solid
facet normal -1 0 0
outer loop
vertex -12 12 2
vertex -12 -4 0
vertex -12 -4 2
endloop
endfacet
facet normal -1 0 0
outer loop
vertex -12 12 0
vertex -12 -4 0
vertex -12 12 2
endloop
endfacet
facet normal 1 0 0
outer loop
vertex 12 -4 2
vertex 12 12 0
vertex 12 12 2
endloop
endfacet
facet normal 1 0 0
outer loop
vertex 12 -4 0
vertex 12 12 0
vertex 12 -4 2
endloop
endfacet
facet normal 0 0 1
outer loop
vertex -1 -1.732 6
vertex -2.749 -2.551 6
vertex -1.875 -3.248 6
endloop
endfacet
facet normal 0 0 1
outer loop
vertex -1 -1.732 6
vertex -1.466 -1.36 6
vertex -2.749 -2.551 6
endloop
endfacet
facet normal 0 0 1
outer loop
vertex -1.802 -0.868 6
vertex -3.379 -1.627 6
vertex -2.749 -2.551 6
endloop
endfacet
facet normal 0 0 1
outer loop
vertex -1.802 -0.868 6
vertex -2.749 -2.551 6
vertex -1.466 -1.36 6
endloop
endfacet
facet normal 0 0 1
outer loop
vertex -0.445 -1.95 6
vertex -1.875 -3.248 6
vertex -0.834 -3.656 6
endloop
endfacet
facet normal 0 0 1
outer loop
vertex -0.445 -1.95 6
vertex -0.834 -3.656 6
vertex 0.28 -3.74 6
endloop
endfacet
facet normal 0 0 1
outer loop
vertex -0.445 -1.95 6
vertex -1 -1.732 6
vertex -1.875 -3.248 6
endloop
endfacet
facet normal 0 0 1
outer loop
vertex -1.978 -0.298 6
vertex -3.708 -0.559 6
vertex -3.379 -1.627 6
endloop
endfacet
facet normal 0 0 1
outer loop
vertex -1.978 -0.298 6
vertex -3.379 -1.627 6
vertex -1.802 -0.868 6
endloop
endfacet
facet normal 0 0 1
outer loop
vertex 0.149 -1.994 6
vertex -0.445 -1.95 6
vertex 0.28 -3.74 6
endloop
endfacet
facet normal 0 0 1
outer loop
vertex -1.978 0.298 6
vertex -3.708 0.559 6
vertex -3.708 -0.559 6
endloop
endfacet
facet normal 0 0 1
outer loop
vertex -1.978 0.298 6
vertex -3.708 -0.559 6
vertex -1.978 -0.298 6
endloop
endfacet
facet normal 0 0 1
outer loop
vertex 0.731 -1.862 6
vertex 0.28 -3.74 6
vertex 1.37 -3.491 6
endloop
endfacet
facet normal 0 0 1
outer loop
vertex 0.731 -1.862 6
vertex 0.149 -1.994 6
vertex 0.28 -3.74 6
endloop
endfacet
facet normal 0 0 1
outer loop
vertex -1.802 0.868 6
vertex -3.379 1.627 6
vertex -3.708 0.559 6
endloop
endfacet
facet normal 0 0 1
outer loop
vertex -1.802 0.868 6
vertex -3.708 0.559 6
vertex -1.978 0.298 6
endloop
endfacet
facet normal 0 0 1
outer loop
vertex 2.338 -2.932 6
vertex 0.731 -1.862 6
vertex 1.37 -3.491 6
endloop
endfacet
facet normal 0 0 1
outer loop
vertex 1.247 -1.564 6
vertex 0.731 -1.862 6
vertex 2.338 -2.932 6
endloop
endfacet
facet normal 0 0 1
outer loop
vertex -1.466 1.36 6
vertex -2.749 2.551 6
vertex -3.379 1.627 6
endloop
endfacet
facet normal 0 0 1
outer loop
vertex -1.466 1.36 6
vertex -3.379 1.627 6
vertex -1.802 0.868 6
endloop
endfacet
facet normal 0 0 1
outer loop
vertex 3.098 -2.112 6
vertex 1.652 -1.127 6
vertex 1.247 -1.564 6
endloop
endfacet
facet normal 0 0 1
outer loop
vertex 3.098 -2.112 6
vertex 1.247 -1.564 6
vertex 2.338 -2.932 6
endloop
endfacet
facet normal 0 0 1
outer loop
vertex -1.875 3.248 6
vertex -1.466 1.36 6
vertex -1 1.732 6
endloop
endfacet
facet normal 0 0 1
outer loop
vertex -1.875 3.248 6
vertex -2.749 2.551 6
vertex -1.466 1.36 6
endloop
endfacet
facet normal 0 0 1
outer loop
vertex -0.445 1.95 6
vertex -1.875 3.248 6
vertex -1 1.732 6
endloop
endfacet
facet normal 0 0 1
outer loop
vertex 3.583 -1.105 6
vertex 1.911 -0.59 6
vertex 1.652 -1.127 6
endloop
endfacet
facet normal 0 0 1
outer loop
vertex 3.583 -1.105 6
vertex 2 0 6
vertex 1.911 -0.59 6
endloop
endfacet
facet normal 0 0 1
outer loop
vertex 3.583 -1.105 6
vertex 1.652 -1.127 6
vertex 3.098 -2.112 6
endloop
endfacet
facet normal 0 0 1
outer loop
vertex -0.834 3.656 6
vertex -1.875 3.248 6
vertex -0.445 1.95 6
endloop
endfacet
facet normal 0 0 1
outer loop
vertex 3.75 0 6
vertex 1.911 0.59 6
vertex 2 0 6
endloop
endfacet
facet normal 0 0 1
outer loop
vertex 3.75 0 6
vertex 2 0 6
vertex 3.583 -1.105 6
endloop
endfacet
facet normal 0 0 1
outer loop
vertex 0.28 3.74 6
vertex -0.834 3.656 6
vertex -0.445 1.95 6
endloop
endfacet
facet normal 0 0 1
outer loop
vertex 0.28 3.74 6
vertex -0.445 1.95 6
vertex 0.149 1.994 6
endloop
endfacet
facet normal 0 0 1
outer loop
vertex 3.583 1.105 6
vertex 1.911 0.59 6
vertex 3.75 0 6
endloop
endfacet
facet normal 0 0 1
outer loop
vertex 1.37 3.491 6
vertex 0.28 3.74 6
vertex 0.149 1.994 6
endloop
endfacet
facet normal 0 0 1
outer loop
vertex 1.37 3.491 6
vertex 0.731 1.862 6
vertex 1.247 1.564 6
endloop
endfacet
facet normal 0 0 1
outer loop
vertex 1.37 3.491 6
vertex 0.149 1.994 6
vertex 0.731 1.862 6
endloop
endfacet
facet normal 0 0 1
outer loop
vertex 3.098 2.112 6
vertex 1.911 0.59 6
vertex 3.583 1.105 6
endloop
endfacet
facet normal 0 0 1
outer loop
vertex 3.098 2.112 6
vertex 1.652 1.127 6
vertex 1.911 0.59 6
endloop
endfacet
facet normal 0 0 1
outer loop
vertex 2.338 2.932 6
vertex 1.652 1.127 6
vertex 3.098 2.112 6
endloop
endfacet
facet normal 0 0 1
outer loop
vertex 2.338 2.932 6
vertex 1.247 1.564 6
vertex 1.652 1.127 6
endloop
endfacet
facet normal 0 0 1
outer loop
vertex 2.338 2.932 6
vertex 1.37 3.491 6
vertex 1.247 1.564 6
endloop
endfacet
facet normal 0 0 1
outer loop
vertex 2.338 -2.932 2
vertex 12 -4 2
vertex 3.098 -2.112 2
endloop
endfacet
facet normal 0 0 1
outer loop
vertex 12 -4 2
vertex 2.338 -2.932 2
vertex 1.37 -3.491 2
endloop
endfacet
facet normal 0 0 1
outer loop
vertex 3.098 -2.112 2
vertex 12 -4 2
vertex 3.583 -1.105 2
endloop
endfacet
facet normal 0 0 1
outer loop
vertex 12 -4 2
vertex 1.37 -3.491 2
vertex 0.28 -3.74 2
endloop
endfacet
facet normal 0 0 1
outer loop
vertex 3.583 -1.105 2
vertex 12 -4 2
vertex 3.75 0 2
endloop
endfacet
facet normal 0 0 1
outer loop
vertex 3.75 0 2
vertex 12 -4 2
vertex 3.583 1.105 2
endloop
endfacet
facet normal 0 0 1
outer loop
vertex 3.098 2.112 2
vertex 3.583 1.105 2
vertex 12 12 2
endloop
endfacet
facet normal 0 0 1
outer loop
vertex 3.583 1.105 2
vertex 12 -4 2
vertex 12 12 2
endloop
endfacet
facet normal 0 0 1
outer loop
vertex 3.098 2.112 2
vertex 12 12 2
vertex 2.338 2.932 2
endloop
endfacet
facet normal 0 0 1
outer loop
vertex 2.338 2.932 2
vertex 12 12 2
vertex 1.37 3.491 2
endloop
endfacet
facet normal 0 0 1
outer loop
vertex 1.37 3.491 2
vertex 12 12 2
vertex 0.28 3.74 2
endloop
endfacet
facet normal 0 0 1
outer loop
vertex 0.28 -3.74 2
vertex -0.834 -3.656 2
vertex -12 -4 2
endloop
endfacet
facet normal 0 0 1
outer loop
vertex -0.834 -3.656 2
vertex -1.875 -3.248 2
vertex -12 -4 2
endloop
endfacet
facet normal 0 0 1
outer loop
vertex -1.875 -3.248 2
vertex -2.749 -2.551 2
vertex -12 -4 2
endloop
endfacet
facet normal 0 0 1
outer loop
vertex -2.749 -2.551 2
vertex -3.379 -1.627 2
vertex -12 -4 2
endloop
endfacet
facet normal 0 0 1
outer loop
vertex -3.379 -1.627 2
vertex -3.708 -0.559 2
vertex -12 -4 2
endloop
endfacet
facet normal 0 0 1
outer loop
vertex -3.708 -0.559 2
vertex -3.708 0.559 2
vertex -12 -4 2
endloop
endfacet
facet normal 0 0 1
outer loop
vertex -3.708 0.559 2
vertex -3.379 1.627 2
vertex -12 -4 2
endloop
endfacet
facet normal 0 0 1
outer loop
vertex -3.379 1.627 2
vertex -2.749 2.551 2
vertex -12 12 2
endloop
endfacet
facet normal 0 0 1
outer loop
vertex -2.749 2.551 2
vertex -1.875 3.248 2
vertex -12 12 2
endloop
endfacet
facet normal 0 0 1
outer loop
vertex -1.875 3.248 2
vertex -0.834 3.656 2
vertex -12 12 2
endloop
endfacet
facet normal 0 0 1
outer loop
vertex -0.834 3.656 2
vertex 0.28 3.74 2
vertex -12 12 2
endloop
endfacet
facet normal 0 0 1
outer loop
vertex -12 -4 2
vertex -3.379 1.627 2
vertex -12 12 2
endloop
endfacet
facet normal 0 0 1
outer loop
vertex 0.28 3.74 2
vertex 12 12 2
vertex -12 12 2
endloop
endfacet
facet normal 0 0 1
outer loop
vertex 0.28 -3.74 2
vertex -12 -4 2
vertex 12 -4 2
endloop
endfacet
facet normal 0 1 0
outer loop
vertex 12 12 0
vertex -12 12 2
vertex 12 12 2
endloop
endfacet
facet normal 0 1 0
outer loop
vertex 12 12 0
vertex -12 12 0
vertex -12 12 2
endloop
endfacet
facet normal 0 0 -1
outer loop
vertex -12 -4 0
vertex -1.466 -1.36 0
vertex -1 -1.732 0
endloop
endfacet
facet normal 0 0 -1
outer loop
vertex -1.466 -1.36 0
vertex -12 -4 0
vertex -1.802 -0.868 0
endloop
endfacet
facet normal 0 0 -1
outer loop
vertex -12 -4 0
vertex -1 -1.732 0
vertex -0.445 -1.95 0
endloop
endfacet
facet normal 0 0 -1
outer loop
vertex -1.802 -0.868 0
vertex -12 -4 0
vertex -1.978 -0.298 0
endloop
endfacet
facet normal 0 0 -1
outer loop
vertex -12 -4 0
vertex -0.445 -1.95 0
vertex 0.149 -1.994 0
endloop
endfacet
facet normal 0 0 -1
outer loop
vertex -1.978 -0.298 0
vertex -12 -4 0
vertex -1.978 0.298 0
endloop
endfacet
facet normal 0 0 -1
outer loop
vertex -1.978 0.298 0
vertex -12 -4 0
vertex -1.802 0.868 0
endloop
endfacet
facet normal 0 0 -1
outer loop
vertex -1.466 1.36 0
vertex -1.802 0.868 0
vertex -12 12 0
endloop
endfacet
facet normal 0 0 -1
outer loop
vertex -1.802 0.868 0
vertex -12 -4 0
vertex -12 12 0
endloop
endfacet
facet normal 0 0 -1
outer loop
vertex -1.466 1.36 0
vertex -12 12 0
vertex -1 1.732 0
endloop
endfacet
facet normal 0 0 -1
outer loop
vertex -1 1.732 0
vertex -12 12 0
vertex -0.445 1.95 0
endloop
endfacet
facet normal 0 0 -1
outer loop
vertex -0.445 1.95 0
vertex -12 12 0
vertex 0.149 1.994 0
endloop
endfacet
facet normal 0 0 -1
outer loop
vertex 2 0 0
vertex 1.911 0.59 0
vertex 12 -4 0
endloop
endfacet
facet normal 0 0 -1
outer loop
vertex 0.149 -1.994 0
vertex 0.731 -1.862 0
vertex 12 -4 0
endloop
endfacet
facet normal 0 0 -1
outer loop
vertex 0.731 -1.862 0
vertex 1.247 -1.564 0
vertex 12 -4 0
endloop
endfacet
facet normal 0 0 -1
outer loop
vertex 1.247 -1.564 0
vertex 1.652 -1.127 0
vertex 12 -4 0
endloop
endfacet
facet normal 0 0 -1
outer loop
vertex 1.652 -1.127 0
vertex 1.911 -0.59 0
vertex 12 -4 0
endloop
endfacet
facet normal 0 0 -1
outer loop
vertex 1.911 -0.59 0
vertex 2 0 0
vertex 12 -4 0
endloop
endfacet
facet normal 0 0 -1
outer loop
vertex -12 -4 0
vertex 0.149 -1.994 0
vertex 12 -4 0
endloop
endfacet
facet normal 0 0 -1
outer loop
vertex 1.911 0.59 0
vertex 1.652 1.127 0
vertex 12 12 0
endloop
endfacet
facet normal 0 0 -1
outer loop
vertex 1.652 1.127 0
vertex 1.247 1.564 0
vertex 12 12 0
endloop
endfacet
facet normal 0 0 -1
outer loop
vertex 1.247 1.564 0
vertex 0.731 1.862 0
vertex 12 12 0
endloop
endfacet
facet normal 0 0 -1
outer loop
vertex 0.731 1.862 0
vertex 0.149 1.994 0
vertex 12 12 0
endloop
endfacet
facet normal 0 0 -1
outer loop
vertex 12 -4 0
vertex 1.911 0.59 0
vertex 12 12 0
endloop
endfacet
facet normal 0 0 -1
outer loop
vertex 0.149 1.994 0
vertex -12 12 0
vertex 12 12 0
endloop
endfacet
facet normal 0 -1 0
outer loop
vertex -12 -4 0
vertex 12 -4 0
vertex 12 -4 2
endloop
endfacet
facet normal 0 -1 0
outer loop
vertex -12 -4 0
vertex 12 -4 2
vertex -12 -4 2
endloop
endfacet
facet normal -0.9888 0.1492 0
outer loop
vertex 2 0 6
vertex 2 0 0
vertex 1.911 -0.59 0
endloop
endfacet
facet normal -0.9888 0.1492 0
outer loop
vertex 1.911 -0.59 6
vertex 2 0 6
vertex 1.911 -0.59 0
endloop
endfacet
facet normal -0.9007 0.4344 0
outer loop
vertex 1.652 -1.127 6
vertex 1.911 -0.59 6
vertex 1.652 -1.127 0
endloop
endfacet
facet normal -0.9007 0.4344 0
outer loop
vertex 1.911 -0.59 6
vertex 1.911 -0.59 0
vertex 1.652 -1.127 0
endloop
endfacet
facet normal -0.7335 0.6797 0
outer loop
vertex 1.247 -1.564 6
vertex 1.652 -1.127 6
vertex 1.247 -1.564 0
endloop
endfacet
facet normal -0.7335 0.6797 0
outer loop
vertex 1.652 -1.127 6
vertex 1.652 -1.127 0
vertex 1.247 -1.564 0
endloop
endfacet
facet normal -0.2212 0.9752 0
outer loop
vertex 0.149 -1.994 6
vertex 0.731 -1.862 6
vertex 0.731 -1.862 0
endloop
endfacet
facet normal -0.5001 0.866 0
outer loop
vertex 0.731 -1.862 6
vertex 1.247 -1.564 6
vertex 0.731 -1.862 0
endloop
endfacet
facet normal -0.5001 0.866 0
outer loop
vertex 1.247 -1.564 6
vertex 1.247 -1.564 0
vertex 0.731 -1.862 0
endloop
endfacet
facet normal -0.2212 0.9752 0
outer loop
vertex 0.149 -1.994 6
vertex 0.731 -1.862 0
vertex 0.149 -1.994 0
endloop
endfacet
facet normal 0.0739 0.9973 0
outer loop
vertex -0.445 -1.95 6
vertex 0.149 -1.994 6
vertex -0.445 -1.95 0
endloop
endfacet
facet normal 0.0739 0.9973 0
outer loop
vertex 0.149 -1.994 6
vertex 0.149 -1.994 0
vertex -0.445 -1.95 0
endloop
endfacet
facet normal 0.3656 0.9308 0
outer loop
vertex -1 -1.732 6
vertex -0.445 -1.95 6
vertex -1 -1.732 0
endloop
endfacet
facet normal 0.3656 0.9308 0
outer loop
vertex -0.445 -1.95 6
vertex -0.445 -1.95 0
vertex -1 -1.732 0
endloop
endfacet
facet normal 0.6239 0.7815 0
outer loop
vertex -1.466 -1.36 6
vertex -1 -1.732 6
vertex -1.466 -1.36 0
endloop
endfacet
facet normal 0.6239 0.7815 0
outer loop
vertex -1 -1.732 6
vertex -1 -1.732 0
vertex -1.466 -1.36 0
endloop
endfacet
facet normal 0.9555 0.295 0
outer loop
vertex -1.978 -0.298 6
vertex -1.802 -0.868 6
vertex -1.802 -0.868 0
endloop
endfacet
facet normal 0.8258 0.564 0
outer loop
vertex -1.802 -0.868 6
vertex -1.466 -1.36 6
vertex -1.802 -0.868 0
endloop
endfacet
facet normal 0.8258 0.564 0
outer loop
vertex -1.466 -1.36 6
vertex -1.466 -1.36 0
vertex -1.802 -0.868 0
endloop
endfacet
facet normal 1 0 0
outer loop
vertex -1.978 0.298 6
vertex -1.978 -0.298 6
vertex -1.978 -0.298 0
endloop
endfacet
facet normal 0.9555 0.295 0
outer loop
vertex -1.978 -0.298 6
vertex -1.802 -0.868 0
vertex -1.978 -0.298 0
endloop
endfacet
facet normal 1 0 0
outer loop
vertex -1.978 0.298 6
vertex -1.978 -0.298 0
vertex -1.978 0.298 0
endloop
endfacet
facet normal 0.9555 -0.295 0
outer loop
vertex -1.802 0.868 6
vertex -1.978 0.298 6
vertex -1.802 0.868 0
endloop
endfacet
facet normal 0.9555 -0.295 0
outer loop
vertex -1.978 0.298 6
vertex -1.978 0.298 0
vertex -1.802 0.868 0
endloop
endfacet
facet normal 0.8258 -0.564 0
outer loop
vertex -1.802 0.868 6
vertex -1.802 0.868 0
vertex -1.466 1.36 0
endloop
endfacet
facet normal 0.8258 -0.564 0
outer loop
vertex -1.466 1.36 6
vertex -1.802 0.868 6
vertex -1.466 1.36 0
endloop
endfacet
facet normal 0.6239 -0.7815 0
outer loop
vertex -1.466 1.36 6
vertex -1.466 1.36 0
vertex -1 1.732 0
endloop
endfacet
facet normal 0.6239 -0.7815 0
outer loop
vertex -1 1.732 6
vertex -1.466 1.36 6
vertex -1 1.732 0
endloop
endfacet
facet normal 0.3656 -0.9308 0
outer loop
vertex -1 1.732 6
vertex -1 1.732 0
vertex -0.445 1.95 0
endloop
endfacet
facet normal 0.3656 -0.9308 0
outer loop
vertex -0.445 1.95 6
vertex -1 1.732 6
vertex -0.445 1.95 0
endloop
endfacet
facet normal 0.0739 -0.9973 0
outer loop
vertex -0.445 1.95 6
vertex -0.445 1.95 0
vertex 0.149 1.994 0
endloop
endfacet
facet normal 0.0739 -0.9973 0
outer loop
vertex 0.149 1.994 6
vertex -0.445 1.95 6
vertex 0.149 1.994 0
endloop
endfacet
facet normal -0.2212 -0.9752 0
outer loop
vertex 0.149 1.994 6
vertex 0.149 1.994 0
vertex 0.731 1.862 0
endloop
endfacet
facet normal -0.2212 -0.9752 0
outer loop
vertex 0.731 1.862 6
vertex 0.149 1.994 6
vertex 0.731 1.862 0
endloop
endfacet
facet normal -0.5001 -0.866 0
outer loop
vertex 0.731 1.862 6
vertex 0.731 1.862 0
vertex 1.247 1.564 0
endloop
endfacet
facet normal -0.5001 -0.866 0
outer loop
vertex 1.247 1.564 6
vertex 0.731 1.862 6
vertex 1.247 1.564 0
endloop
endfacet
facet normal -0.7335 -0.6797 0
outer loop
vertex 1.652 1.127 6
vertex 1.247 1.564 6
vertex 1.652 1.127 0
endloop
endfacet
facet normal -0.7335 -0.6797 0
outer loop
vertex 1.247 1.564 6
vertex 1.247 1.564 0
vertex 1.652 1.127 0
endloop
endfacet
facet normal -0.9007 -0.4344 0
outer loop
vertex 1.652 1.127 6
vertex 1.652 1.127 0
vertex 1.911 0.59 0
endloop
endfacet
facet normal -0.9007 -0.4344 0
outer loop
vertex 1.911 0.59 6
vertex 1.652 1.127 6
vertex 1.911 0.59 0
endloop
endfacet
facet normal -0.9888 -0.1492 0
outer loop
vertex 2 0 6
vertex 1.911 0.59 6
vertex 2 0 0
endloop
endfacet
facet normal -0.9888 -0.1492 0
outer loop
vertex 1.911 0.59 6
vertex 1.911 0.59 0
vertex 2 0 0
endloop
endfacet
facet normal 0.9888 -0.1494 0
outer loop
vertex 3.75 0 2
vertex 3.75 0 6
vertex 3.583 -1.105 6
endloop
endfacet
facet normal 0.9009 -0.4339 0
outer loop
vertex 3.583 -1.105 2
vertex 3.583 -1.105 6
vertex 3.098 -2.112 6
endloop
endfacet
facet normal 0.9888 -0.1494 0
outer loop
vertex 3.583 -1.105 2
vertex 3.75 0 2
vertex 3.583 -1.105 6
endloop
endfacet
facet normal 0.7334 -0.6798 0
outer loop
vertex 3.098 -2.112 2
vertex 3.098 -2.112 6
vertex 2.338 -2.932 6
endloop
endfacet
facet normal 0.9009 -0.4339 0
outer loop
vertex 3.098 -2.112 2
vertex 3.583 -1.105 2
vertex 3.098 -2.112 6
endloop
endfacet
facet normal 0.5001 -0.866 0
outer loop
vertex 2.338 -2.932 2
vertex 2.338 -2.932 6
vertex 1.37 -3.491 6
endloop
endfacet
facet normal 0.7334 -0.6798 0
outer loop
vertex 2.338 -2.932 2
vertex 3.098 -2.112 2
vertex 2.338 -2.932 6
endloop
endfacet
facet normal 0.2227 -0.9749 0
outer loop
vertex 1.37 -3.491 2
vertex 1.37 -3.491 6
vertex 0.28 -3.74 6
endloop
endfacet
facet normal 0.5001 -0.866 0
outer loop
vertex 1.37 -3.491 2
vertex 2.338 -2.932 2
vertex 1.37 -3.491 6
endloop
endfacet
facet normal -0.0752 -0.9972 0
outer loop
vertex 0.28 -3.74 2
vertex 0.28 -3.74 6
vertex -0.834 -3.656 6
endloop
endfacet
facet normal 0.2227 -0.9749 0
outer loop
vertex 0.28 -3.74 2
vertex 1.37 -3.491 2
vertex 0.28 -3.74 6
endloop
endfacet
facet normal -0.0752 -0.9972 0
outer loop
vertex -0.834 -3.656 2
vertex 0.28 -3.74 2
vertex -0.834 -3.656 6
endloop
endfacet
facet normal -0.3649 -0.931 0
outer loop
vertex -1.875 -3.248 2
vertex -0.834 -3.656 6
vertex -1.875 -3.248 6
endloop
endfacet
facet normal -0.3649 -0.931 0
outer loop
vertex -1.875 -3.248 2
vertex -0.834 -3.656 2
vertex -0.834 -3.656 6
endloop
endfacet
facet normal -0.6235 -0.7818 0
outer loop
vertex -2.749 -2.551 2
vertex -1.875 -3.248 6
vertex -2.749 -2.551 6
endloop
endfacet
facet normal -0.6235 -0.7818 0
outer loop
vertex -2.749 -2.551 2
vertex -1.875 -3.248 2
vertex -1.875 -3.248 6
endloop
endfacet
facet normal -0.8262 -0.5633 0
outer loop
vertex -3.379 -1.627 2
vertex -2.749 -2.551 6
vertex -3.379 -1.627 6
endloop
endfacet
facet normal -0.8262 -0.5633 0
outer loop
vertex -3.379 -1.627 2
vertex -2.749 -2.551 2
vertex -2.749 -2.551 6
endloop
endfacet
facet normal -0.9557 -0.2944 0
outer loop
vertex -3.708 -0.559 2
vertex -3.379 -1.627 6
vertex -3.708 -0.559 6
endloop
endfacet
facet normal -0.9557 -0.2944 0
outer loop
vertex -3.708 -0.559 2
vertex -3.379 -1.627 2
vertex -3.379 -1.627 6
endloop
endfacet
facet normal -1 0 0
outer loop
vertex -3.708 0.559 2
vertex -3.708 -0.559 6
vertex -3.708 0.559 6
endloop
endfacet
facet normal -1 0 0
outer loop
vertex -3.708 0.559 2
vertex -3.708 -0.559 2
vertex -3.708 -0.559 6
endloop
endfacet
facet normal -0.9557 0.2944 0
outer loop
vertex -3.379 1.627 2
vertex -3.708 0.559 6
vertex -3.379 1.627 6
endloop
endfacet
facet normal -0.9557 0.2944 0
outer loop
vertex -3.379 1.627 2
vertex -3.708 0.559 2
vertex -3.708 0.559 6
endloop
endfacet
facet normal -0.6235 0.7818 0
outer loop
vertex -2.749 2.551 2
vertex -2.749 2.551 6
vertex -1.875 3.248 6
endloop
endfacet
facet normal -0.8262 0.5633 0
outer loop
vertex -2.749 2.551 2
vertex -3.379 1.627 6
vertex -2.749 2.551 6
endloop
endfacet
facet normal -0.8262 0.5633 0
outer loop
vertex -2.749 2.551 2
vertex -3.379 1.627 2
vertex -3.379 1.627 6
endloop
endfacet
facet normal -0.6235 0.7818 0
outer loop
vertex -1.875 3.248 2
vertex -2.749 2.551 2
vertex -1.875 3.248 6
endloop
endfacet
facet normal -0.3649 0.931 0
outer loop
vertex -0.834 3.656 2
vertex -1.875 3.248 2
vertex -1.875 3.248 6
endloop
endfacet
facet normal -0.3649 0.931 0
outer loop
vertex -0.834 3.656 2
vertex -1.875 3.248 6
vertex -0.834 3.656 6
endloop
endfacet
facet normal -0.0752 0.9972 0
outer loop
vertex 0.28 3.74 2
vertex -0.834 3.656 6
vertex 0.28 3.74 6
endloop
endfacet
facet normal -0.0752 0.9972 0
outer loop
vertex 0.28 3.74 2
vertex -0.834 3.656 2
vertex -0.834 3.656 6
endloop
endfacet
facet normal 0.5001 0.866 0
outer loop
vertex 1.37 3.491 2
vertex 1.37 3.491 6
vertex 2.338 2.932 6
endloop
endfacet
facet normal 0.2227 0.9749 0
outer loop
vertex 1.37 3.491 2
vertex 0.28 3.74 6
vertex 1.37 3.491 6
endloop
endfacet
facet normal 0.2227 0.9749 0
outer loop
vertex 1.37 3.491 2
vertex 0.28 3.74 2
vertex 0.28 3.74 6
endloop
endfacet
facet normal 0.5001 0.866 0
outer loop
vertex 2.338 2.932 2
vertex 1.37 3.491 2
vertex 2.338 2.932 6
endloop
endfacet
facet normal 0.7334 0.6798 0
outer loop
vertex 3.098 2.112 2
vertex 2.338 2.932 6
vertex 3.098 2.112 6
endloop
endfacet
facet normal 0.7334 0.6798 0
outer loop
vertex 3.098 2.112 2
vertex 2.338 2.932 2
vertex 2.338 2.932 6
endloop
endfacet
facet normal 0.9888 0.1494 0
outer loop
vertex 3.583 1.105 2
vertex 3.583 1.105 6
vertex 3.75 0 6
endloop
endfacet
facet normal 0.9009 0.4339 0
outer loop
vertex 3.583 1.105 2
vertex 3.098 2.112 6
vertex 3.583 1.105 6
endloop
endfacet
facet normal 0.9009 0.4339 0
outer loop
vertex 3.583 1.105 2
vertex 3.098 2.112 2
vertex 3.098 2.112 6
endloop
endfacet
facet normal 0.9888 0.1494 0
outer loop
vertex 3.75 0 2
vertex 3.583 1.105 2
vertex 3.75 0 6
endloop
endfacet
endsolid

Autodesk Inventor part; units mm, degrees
ref_plane "YZ Plane" through (0, 0, 0) normal (1, 0, 0) x (0, 1, 0)
ref_plane "XZ Plane" through (0, 0, 0) normal (0, 1, 0) x (-1, 0, 0)
ref_plane "XY Plane" through (0, 0, 0) normal (0, 0, 1) x (1, 0, 0)
sketch "Sketch2" plane through (0, 0, 0) normal (0, 0, 1) x (1, 0, 0)
  circle A0 centre (0, 0) radius 3.75
  circle A1 centre (0, 0) radius 2
  dimension "d6" = 7.5
  dimension "d7" = 4
extrude "Extrusion1" add sketch "Sketch2" along normal blind 6
sketch "Sketch3" plane through (0, 0, 0) normal (0, 0, -1) x (-1, 0, 0)
  line L0 (-12, -4) -> (12, -4)
  line L1 (12, -4) -> (12, 12)
  line L2 (12, 12) -> (-12, 12)
  line L3 (-12, 12) -> (-12, -4)
  line L4 (0, 0) -> (0, 4.4651)
  line L5 (0, 4.4651) -> (0, 0)
  line L6 (0, 0) -> (5, 0)
  circle A0 centre (0, 0) radius 2 projected
  circle A1 centre (0, 0) radius 2
  dimension "d10" = 24
  dimension "d11" = 16
  dimension "d12" = 4
extrude "Extrusion4" add sketch "Sketch3" against normal blind 2
properties part number "fijador.rodamiento"
